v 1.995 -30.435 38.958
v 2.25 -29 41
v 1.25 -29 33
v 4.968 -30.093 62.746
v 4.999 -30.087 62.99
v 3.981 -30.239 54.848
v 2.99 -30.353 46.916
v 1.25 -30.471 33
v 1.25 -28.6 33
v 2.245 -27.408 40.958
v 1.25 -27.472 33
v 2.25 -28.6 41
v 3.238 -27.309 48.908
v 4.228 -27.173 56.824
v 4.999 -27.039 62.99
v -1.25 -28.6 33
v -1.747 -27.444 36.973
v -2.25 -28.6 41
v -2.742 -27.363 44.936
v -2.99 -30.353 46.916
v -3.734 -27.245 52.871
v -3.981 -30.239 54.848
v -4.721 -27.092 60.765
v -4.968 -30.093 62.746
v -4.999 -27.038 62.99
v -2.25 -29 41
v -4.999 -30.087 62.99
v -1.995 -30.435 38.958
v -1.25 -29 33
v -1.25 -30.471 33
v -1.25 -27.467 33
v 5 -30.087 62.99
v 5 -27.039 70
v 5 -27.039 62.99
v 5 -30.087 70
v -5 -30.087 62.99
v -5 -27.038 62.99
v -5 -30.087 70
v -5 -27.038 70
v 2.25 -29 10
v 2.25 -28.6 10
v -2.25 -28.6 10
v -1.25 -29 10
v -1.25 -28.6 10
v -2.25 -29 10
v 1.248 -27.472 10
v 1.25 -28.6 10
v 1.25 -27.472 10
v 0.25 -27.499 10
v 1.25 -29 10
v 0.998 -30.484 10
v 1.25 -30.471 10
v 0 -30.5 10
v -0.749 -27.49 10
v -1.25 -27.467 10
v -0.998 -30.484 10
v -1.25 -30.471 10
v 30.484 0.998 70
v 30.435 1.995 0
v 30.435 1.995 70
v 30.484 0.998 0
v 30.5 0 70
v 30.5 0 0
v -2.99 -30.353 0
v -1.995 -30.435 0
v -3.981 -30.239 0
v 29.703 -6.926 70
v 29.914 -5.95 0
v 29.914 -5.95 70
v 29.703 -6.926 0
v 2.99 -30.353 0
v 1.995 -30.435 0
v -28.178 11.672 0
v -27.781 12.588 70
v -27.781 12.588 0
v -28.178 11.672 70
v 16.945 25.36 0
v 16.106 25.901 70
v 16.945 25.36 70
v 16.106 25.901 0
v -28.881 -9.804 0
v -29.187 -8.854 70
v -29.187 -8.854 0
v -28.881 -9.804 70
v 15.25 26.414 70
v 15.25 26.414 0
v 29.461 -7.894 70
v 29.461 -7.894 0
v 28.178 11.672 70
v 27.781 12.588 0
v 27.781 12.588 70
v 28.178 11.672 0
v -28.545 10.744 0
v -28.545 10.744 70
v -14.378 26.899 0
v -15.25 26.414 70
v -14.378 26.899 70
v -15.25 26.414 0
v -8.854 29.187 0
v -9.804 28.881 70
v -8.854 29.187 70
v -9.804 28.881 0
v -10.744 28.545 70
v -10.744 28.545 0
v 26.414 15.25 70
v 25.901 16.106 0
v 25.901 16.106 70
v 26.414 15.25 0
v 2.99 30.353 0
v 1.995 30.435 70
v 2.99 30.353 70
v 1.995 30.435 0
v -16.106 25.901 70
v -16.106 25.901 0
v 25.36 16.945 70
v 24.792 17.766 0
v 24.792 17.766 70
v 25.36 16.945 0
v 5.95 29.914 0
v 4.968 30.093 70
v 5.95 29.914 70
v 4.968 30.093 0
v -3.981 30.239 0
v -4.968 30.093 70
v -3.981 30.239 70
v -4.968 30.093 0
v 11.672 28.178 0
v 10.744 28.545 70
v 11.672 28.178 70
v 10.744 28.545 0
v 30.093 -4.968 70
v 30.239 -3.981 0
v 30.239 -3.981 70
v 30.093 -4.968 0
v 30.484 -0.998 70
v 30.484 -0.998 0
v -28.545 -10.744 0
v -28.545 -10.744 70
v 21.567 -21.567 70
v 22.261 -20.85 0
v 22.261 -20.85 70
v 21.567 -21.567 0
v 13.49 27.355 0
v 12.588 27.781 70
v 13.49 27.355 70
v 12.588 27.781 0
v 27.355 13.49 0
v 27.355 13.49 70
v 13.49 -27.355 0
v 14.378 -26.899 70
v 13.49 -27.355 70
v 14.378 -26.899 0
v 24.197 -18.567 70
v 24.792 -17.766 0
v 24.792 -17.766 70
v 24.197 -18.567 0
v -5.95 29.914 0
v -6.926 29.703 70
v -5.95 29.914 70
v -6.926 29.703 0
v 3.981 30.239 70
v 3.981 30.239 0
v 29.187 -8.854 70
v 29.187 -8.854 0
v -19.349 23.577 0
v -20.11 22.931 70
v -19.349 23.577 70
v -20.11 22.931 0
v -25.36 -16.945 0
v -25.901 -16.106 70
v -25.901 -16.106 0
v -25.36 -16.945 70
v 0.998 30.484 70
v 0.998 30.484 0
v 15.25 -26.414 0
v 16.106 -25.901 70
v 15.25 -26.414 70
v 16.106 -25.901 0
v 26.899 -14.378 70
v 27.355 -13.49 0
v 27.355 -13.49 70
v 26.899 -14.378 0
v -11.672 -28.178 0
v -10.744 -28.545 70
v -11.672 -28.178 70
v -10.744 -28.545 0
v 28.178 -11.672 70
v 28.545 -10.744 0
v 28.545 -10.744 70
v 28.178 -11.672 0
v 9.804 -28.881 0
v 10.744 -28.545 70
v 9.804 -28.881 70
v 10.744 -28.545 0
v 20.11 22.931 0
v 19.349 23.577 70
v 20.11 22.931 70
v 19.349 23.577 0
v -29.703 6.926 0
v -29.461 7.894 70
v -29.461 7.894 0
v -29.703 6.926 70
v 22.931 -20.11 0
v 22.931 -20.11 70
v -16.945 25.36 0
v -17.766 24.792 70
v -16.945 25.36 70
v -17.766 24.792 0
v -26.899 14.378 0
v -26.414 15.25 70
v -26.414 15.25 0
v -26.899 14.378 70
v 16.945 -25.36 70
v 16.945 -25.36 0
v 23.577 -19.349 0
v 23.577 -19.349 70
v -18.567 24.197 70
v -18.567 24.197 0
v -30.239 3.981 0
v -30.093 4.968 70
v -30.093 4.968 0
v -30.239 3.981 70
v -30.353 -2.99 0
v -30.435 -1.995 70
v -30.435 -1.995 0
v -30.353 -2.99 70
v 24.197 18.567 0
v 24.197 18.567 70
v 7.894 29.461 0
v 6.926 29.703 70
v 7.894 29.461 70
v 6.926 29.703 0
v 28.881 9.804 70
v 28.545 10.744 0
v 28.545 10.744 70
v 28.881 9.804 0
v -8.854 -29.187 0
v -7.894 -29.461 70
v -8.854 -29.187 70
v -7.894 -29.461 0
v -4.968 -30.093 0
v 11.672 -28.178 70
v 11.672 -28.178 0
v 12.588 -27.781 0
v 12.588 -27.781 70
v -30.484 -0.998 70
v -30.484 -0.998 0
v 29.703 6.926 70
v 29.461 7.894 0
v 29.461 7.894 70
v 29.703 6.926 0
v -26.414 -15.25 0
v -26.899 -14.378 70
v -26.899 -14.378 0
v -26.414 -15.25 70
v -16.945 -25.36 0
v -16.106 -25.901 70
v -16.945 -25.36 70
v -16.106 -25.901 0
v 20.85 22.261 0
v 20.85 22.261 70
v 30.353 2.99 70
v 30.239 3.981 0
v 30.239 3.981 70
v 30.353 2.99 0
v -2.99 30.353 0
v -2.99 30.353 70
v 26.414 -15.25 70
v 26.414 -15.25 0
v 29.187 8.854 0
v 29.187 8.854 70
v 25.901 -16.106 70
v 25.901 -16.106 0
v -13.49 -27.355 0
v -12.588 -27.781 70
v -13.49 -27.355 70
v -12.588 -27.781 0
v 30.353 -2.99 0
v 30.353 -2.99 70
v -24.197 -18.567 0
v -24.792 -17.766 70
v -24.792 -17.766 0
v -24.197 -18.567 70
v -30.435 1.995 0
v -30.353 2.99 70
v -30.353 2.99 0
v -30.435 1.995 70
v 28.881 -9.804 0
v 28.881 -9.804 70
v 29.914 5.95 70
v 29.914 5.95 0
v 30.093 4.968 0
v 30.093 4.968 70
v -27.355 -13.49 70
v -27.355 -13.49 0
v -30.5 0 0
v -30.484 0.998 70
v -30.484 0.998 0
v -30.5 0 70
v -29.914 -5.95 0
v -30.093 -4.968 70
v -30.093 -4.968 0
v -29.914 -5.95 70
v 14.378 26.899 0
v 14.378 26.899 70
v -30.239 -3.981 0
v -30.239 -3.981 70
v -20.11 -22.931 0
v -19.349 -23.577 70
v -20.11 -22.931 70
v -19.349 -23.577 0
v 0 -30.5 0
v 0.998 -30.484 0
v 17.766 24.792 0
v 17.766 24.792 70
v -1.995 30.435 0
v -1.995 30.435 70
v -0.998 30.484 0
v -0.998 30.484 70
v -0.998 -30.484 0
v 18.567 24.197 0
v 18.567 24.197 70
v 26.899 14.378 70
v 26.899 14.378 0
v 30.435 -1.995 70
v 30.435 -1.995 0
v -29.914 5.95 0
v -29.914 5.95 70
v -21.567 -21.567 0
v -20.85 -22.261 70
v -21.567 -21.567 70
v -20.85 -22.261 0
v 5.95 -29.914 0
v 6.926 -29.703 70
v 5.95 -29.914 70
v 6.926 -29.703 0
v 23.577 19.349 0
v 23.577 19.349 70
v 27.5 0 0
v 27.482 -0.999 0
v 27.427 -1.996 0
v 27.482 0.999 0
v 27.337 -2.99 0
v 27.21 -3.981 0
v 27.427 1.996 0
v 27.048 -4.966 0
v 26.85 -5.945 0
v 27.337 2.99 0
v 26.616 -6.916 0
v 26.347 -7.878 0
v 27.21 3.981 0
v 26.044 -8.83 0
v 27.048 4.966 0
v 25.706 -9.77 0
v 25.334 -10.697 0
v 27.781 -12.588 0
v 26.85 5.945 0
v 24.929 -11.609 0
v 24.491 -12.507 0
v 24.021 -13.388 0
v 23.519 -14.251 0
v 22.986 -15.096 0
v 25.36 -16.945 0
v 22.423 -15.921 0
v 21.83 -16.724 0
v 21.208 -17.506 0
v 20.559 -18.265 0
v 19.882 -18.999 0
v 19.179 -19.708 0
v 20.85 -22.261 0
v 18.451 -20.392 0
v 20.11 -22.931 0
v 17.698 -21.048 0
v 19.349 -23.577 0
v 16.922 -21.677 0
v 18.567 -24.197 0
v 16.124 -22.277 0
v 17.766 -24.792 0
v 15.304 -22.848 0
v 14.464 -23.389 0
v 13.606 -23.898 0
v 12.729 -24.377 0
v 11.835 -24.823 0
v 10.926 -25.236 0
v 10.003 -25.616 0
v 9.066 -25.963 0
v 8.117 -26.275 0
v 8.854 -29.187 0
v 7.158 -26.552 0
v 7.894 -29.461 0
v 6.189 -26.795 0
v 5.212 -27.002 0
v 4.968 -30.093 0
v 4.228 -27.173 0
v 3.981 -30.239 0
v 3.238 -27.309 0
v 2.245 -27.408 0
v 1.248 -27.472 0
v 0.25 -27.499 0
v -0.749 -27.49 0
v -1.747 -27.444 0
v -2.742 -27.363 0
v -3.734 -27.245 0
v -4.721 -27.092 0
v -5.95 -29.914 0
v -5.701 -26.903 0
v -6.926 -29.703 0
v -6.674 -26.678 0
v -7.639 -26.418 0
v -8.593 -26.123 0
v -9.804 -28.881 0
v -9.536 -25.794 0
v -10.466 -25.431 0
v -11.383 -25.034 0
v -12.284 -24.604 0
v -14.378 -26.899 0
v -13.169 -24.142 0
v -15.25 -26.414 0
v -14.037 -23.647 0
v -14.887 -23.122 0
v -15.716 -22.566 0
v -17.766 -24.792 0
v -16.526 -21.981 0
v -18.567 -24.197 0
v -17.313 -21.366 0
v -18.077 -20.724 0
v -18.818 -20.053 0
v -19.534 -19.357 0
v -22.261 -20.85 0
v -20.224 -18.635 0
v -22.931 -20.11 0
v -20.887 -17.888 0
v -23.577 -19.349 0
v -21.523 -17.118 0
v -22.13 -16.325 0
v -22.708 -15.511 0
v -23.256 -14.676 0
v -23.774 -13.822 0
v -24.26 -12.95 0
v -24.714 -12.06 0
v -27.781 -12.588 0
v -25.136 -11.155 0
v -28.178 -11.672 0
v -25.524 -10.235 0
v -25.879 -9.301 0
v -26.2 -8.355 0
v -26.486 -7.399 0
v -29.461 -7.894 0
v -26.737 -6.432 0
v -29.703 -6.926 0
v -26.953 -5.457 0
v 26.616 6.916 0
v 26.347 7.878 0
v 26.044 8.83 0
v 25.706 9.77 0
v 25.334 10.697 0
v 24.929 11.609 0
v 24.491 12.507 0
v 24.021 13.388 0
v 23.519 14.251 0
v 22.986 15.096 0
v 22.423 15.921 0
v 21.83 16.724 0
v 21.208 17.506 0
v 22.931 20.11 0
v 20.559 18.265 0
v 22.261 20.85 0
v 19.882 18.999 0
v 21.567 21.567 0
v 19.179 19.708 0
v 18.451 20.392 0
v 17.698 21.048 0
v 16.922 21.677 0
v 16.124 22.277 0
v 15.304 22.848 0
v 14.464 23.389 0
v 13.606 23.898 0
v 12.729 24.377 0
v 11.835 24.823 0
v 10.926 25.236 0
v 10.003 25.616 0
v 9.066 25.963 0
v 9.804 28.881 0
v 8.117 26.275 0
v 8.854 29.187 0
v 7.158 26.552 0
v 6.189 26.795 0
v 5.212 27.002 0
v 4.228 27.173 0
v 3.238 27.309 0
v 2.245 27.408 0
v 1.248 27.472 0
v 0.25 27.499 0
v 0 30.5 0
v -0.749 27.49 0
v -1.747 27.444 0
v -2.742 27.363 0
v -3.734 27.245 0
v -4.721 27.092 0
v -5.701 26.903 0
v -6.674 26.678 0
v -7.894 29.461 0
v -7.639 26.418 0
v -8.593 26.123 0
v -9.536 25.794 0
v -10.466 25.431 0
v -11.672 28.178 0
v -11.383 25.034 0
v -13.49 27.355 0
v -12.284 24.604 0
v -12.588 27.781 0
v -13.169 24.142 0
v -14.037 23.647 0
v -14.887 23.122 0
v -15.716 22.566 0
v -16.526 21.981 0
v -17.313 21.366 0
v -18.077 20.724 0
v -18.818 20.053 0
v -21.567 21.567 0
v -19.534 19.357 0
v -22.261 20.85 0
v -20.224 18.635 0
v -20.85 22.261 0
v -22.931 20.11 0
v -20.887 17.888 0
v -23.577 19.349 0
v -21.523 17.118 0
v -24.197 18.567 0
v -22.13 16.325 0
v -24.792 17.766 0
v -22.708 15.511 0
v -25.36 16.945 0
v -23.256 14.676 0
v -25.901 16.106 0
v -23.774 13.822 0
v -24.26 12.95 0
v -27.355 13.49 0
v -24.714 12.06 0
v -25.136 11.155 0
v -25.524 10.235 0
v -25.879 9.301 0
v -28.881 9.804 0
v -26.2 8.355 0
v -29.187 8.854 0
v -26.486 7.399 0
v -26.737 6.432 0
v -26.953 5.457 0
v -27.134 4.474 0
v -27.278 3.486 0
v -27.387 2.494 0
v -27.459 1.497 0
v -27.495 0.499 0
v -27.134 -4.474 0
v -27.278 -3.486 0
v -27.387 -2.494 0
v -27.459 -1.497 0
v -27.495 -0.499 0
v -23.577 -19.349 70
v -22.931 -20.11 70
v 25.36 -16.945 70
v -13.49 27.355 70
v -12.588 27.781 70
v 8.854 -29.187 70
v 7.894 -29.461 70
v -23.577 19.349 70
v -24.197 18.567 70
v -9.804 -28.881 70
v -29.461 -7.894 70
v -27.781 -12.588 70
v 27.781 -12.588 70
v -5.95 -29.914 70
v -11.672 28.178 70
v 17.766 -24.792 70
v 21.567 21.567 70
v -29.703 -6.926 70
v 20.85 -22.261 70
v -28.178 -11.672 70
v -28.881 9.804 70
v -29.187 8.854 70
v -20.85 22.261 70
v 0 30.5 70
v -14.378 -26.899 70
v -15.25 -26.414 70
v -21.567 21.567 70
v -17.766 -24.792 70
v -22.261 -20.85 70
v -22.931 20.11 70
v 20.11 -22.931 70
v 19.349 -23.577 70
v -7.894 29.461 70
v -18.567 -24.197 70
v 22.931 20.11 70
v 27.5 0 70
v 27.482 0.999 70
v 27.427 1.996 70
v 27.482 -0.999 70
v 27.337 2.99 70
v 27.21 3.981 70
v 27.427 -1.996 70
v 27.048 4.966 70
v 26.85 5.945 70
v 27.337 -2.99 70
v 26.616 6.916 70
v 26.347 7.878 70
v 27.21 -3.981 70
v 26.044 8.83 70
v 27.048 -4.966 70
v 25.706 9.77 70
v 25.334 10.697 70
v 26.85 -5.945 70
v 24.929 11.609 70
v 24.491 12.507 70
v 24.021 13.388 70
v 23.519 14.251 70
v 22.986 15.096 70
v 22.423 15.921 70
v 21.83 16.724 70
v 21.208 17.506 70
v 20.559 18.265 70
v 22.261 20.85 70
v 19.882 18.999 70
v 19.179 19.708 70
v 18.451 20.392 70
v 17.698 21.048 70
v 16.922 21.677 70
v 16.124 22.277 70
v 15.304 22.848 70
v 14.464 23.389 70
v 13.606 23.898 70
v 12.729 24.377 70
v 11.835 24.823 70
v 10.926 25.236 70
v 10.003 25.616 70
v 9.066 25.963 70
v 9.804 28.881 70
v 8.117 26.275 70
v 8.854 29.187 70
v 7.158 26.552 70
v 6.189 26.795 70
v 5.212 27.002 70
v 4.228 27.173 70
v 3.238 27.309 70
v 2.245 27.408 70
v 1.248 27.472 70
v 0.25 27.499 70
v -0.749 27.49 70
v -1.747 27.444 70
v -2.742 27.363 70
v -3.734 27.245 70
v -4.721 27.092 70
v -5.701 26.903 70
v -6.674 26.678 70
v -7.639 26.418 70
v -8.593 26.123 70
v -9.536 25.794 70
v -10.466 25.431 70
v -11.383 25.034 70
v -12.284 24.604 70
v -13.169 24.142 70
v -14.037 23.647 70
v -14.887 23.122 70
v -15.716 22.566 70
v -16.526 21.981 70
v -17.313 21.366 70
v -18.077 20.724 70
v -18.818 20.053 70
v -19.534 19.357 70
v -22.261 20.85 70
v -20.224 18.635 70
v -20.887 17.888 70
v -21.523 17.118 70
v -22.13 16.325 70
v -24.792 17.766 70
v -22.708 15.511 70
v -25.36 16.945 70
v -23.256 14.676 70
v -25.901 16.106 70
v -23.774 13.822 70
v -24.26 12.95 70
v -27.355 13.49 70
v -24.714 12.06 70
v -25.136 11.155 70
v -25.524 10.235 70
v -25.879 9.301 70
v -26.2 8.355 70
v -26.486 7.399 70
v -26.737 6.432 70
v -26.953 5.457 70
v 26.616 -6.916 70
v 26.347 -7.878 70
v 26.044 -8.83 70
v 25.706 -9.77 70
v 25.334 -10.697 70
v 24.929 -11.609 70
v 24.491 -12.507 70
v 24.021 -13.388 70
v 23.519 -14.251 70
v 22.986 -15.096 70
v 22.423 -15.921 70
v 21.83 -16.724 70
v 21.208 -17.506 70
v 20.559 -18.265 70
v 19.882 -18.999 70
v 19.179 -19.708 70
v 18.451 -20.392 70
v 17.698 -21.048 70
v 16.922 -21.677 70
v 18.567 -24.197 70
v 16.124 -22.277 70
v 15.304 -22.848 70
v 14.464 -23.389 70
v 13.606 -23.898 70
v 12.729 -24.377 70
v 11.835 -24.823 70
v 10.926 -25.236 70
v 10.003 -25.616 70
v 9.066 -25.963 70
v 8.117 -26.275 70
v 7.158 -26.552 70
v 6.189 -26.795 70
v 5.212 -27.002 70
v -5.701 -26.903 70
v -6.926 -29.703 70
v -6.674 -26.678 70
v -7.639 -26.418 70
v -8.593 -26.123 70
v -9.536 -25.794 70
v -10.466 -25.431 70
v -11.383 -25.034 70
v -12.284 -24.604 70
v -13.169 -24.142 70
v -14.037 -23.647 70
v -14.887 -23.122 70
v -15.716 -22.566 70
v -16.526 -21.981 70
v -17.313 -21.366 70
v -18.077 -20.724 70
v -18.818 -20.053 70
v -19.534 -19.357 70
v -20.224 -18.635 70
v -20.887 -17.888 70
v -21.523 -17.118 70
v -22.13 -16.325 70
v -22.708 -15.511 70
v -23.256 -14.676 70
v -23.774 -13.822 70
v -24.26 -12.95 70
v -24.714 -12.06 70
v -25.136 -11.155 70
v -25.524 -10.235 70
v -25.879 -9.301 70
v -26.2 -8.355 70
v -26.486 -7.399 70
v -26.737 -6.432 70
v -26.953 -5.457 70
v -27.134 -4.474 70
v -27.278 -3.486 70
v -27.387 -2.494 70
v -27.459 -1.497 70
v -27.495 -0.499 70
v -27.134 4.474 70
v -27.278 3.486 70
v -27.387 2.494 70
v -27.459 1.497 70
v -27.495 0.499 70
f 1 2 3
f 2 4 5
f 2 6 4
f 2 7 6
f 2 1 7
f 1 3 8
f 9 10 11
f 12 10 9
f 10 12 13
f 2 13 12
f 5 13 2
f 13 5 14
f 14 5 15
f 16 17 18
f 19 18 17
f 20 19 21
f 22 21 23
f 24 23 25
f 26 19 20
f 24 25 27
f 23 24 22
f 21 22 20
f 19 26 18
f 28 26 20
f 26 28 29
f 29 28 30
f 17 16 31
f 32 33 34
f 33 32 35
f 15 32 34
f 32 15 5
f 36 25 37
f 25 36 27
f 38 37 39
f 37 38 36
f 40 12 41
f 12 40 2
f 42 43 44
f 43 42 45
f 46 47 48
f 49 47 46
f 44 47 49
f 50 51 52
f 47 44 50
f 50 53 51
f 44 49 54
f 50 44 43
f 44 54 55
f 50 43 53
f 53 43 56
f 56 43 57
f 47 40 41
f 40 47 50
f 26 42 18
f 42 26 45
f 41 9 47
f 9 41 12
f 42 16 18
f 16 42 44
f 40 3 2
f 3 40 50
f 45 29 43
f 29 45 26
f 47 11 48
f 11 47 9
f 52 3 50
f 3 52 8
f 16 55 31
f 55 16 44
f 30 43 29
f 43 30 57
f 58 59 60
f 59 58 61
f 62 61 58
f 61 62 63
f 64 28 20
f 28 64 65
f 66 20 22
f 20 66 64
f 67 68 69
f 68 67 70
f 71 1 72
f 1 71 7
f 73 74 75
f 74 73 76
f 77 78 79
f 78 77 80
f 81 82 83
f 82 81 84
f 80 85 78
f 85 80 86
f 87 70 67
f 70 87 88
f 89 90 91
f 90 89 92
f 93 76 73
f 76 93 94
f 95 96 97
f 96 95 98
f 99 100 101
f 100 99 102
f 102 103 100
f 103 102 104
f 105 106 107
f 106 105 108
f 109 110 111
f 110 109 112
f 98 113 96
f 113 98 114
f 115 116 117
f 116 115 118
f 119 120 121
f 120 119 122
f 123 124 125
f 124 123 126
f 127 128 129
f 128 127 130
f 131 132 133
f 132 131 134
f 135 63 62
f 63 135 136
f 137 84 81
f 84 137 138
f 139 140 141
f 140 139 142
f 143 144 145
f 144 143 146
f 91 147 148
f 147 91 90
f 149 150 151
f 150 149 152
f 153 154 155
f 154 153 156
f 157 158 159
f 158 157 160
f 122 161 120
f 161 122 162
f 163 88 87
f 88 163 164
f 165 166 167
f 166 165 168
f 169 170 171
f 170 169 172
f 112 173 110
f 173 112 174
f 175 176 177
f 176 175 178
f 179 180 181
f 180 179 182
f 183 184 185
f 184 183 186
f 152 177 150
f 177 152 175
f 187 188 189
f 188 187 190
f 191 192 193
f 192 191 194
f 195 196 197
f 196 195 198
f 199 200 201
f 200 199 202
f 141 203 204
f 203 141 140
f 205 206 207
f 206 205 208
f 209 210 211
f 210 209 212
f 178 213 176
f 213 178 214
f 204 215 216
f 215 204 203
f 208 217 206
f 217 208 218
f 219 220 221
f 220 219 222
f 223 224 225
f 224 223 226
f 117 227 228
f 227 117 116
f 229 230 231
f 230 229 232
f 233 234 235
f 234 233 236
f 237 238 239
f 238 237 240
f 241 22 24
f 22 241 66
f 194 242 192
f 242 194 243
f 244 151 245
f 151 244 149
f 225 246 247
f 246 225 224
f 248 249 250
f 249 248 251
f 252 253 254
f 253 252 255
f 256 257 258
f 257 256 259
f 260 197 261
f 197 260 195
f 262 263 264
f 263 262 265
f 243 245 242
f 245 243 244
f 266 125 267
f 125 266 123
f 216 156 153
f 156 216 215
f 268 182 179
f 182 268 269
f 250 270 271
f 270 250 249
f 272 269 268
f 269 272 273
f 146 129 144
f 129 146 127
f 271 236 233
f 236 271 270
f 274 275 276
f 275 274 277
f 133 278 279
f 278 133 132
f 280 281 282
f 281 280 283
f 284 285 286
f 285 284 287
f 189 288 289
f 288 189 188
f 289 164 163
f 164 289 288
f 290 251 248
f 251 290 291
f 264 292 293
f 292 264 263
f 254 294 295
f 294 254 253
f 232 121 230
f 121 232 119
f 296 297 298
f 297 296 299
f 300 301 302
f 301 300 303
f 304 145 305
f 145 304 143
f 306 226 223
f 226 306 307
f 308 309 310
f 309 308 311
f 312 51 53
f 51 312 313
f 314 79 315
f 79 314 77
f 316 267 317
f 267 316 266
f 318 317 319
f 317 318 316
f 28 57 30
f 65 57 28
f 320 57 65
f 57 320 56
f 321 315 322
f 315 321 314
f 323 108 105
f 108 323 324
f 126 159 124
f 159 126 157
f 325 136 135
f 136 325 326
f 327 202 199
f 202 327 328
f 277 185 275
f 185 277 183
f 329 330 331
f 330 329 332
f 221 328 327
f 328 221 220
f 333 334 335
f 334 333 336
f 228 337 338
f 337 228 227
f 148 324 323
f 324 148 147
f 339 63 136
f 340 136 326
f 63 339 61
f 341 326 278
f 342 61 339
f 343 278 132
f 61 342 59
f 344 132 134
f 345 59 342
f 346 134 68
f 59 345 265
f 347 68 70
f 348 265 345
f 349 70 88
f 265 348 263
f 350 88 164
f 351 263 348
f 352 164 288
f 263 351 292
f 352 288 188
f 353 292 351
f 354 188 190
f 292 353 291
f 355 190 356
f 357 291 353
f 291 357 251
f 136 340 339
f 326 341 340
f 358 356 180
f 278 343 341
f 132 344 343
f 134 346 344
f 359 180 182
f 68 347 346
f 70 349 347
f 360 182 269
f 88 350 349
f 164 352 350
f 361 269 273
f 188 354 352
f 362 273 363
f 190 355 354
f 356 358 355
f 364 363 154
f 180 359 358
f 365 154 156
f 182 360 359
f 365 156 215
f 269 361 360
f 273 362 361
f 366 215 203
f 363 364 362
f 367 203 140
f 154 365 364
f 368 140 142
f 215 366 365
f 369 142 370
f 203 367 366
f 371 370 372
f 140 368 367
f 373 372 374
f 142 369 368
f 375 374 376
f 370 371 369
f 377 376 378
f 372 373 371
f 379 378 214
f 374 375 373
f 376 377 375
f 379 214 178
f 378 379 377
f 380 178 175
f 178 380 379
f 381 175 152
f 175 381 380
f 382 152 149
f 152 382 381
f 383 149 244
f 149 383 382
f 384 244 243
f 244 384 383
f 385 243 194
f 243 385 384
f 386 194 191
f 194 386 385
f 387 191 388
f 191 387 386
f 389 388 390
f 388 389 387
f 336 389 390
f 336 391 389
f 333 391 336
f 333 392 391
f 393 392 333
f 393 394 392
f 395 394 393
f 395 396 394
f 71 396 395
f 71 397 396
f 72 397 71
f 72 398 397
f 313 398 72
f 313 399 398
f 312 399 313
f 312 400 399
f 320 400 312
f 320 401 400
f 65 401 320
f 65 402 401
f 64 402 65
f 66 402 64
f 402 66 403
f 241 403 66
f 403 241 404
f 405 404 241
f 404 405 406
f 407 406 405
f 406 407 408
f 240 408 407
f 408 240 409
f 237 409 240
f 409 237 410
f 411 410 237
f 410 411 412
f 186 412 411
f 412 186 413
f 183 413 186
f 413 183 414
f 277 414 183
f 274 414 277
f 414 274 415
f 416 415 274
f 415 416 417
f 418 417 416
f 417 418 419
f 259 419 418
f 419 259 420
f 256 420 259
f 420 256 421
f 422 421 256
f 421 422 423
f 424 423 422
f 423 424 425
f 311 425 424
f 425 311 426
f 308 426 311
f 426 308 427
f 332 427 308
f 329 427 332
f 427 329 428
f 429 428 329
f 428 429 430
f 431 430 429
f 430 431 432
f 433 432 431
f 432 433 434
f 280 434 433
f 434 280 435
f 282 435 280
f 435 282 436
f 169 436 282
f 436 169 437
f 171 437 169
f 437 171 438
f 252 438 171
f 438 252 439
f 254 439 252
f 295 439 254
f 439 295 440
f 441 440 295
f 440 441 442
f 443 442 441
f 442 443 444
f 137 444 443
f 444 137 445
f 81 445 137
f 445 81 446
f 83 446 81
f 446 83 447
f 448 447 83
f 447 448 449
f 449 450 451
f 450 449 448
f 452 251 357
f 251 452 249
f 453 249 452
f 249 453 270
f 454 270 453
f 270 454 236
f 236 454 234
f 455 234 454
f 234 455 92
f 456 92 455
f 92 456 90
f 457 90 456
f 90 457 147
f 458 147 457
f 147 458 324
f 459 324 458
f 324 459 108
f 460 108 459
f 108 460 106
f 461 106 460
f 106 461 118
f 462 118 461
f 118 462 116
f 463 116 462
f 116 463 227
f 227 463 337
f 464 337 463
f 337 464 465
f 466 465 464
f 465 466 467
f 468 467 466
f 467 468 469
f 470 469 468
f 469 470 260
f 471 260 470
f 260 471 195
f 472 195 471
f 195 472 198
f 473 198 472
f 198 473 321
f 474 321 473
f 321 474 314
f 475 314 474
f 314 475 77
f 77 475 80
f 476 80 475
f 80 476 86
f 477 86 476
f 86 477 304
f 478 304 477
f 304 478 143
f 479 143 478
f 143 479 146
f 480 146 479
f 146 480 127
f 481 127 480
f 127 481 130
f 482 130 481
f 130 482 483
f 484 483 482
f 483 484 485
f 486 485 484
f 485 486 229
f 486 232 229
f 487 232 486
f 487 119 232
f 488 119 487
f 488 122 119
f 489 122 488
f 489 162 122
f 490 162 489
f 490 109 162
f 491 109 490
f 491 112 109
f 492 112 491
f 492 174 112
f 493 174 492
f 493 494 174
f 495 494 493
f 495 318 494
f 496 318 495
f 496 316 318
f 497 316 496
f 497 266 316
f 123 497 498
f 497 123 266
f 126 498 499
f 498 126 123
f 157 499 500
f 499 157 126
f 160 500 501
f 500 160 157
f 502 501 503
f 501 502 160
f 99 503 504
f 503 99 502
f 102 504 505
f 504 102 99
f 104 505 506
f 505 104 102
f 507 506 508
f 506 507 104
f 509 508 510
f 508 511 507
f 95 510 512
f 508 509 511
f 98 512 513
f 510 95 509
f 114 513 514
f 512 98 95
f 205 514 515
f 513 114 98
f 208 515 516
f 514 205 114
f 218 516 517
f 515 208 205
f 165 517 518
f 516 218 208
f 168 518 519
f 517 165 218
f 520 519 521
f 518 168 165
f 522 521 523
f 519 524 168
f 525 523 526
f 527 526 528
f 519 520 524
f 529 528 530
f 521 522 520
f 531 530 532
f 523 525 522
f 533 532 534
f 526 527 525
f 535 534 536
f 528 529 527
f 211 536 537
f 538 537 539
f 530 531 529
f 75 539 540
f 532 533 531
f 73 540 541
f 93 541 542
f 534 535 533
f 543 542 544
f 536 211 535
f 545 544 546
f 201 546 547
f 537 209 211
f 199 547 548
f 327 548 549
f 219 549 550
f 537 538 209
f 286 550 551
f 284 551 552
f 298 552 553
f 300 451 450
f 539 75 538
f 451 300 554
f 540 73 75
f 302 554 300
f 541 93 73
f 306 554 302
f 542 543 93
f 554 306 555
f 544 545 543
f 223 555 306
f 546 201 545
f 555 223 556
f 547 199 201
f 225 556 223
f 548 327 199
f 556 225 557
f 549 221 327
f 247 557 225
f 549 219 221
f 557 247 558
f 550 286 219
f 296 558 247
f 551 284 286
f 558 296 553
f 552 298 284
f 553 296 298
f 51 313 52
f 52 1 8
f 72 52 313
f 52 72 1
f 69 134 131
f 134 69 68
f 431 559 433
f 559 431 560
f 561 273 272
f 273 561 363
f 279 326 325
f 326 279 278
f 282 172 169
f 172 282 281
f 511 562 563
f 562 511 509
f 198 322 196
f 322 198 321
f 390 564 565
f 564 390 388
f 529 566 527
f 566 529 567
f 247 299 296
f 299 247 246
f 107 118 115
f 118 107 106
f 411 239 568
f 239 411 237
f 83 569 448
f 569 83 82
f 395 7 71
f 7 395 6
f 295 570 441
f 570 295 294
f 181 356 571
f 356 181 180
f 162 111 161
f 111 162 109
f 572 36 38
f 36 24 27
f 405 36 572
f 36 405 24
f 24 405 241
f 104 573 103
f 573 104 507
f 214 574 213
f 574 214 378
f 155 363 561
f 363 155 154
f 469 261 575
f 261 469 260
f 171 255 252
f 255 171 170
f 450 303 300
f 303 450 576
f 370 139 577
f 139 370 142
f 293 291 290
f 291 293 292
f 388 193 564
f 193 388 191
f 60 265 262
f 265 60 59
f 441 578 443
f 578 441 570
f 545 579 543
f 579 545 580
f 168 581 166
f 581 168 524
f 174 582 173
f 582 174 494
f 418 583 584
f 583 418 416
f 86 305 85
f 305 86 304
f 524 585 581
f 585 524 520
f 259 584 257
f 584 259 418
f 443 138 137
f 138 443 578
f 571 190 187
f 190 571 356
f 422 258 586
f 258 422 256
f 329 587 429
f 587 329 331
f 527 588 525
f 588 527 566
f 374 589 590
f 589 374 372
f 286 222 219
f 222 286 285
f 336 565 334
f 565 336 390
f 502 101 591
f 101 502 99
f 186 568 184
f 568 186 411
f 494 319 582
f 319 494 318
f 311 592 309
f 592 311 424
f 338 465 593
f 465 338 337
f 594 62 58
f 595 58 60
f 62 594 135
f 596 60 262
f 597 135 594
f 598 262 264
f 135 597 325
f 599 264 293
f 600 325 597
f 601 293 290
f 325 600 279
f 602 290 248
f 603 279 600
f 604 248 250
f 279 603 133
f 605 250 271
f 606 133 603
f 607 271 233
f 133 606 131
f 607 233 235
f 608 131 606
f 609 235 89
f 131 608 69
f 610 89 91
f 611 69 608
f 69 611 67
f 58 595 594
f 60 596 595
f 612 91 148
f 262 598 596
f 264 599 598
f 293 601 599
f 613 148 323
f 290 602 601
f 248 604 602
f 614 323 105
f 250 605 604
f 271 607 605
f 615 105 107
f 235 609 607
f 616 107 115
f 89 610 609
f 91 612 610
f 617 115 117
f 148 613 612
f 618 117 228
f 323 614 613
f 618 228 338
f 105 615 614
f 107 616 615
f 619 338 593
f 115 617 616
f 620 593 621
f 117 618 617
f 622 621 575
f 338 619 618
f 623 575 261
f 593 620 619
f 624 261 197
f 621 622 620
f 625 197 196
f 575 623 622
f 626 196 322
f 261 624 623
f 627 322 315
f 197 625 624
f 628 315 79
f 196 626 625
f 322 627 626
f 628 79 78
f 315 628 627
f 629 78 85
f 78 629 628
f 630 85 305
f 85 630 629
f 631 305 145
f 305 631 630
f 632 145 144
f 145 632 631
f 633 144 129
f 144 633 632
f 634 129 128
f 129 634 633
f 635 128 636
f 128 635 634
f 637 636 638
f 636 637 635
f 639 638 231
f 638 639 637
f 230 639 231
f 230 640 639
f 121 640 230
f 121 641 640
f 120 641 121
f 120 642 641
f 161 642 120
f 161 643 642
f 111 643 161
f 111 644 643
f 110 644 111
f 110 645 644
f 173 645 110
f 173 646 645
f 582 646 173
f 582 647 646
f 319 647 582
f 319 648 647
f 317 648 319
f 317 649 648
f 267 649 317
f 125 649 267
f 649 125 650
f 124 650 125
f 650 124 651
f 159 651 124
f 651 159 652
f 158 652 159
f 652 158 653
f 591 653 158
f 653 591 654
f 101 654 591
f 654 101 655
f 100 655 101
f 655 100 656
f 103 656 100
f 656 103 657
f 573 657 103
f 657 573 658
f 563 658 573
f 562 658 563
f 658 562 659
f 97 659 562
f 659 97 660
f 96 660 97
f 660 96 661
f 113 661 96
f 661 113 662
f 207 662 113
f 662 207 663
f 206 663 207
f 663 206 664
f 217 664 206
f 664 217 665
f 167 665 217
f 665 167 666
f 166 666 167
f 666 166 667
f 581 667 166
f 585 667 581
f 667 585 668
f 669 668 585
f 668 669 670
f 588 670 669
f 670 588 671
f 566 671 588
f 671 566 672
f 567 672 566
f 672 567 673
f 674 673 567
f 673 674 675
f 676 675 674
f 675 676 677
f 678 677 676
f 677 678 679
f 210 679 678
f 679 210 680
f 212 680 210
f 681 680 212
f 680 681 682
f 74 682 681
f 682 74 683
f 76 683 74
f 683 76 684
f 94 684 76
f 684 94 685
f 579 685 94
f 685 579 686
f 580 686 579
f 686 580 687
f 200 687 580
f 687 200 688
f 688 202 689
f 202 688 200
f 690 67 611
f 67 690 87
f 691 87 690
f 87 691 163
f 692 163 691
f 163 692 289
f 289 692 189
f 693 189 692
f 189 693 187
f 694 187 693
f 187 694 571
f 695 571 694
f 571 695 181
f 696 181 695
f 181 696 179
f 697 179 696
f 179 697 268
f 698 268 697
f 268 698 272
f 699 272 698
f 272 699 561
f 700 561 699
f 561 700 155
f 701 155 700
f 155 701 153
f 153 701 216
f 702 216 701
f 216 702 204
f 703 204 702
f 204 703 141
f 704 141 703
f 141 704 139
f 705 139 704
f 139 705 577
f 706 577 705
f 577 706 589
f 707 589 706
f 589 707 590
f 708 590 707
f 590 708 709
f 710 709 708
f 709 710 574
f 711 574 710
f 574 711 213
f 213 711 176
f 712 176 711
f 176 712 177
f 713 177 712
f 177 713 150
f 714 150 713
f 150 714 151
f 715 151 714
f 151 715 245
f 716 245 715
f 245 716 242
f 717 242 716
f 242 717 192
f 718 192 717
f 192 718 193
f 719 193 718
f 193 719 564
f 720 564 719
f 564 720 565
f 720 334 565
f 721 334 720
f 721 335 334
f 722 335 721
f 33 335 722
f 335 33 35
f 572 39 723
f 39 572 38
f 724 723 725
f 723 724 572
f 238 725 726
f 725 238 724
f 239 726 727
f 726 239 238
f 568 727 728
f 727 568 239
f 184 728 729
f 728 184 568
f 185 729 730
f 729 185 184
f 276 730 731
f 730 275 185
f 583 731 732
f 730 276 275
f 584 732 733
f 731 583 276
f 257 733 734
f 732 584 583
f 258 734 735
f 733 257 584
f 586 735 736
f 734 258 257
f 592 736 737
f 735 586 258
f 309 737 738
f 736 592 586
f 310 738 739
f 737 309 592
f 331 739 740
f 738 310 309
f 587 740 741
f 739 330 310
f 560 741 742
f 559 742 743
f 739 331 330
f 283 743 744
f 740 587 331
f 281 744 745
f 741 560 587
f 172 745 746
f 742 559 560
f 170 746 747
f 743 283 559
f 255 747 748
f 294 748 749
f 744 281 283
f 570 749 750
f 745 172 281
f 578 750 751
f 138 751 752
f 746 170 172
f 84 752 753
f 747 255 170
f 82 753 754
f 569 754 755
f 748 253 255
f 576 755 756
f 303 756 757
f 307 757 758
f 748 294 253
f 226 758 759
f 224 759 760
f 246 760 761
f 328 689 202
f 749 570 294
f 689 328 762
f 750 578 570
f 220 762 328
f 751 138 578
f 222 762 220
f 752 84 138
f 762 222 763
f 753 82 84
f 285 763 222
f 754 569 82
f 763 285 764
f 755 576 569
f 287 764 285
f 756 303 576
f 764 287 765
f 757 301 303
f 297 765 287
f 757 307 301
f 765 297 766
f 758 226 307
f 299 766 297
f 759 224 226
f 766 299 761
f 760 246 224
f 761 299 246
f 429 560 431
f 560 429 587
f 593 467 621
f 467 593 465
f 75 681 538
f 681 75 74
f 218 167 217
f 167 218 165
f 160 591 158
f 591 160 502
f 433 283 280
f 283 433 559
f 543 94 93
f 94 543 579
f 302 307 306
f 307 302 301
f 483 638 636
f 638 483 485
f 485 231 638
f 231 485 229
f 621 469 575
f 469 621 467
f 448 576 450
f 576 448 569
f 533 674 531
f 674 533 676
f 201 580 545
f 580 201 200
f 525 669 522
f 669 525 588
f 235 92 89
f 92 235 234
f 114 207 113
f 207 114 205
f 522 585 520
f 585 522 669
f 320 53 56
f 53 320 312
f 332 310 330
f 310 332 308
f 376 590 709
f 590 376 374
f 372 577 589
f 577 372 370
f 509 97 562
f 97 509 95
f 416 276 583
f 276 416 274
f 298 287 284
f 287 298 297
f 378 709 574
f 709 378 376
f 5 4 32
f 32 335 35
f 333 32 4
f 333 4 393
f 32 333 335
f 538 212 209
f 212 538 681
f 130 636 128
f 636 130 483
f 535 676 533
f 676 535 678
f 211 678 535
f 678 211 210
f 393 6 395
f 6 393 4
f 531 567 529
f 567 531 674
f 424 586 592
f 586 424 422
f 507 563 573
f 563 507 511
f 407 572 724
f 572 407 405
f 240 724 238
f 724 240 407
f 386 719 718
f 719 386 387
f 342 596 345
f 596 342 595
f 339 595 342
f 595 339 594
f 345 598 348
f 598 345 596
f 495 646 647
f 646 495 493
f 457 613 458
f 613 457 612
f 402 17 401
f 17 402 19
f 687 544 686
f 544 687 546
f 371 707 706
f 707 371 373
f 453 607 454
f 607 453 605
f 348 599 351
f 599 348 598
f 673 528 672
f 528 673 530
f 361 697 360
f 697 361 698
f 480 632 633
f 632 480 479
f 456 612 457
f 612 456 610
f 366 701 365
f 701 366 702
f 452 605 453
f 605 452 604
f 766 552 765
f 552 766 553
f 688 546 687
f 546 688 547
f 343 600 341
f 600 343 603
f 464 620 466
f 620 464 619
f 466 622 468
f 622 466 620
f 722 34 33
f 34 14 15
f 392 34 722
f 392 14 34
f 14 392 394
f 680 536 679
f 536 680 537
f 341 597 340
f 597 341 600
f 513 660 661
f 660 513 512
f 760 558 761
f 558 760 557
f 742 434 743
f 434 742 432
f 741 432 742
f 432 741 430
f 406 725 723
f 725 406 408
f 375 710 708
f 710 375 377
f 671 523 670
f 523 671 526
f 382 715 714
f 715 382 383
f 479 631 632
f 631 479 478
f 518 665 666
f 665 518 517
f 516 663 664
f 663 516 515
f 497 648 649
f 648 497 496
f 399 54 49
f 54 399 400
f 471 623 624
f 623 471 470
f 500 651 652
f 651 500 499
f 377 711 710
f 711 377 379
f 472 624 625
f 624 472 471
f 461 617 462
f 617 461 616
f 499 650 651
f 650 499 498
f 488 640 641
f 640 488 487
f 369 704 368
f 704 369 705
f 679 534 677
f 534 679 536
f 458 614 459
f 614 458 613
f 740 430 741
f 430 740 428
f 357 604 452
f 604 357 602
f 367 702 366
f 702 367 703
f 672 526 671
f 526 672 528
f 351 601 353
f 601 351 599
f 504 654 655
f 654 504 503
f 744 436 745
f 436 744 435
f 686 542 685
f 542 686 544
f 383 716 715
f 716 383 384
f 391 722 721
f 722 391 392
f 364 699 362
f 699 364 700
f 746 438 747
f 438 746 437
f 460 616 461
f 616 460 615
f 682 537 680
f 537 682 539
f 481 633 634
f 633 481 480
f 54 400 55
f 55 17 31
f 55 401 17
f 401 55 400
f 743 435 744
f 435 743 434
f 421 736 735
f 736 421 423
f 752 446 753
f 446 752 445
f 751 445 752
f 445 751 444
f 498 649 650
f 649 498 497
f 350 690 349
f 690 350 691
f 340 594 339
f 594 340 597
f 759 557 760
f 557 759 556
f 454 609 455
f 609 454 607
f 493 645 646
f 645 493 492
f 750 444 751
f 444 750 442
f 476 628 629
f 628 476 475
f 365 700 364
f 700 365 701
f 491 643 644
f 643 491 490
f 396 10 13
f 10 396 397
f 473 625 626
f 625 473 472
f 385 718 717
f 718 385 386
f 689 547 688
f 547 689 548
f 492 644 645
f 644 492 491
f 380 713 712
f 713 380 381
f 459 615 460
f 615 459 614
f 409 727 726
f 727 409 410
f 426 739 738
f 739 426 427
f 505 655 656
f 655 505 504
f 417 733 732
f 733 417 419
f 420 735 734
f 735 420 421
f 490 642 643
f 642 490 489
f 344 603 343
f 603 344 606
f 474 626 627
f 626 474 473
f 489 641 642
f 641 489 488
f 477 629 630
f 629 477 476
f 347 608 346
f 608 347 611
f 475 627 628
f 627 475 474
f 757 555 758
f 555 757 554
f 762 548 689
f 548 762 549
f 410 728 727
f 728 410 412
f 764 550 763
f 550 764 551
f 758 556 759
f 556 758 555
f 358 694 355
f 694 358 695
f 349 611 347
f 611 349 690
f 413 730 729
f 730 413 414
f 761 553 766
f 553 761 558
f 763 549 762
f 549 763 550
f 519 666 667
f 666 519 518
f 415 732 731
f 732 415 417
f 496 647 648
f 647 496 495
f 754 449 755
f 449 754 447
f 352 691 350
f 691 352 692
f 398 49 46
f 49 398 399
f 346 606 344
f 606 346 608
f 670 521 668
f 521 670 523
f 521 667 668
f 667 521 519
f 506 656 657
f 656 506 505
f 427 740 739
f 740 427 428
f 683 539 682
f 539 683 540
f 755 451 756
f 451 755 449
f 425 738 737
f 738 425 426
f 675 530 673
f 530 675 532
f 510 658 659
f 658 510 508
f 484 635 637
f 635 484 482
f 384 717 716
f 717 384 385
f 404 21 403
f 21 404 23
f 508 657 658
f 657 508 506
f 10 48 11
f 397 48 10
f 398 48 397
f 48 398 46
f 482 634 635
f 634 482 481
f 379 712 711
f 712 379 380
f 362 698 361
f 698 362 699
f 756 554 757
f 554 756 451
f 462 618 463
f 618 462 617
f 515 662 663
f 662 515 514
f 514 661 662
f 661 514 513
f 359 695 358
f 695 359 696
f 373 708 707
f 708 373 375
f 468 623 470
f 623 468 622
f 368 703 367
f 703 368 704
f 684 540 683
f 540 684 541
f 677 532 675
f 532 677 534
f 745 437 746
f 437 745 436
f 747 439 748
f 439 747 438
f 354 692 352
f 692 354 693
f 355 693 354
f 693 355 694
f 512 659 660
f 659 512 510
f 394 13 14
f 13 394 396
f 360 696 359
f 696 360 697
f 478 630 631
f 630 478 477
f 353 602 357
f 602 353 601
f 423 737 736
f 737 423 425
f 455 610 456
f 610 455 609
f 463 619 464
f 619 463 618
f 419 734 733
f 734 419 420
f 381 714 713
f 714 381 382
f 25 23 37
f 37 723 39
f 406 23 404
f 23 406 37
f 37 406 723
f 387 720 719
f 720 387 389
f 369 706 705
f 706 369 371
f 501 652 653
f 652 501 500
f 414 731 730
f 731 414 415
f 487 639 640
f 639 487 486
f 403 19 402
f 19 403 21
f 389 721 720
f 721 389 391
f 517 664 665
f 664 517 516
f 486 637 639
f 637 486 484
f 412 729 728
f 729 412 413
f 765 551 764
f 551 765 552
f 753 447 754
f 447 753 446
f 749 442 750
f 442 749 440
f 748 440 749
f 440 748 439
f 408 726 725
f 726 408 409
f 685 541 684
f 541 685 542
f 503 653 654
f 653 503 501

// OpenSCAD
bladeLength = 23;
bladeWidth = 4.5;
bladeThickness = 0.4;

bladeOpening = 2.5;
bladeLeadInWidth = 10;
bladeLeadInLength = 30;

bladeOffset = 10;

bodyDiameter = 55;
bodyLength = 70;
bodyThickness = 3;

$fa = 1;
$fs = 1;

bodyOuterDiameter = bodyDiameter + 2 * bodyThickness;

module cutter() {
    difference() {
        cylinder(bodyLength, d = bodyOuterDiameter);
        
        translate([0, 0, -0.01])
        cylinder(bodyLength + 0.02, d = bodyDiameter);
        
        translate([-bladeWidth / 2, -(bodyDiameter + bodyThickness) / 2, bladeOffset])
        bladeCutOut();
    }
}

module bladeCutOut() {
    cube([bladeWidth, bladeThickness, bladeLength * 2]);
    
    translate([(bladeWidth - bladeOpening) / 2, -bodyThickness, 0])
    cube([bladeOpening, bodyThickness * 2, bladeLength * 2]);
    
    translate([(bladeWidth - bladeLeadInWidth) / 2, 0, bladeLength])
    bladeLeadIn();
}

module bladeLeadIn() {
    leadInDiff = bladeLeadInWidth - bladeOpening;
    
    translate([0, bodyThickness, 0])
    rotate([90, 0, 0])
    linear_extrude(2 * bodyThickness)
    polygon([
        [bladeLeadInWidth, bladeLeadInLength],
        [0, bladeLeadInLength],
        [leadInDiff / 2, 0],
        [bladeLeadInWidth - leadInDiff / 2, 0]
    ]);
    
    translate([0, -bodyThickness, bladeLeadInLength - 0.01])
    cube([bladeLeadInWidth, 2 * bodyThickness, bodyLength]);
}

cutter();
